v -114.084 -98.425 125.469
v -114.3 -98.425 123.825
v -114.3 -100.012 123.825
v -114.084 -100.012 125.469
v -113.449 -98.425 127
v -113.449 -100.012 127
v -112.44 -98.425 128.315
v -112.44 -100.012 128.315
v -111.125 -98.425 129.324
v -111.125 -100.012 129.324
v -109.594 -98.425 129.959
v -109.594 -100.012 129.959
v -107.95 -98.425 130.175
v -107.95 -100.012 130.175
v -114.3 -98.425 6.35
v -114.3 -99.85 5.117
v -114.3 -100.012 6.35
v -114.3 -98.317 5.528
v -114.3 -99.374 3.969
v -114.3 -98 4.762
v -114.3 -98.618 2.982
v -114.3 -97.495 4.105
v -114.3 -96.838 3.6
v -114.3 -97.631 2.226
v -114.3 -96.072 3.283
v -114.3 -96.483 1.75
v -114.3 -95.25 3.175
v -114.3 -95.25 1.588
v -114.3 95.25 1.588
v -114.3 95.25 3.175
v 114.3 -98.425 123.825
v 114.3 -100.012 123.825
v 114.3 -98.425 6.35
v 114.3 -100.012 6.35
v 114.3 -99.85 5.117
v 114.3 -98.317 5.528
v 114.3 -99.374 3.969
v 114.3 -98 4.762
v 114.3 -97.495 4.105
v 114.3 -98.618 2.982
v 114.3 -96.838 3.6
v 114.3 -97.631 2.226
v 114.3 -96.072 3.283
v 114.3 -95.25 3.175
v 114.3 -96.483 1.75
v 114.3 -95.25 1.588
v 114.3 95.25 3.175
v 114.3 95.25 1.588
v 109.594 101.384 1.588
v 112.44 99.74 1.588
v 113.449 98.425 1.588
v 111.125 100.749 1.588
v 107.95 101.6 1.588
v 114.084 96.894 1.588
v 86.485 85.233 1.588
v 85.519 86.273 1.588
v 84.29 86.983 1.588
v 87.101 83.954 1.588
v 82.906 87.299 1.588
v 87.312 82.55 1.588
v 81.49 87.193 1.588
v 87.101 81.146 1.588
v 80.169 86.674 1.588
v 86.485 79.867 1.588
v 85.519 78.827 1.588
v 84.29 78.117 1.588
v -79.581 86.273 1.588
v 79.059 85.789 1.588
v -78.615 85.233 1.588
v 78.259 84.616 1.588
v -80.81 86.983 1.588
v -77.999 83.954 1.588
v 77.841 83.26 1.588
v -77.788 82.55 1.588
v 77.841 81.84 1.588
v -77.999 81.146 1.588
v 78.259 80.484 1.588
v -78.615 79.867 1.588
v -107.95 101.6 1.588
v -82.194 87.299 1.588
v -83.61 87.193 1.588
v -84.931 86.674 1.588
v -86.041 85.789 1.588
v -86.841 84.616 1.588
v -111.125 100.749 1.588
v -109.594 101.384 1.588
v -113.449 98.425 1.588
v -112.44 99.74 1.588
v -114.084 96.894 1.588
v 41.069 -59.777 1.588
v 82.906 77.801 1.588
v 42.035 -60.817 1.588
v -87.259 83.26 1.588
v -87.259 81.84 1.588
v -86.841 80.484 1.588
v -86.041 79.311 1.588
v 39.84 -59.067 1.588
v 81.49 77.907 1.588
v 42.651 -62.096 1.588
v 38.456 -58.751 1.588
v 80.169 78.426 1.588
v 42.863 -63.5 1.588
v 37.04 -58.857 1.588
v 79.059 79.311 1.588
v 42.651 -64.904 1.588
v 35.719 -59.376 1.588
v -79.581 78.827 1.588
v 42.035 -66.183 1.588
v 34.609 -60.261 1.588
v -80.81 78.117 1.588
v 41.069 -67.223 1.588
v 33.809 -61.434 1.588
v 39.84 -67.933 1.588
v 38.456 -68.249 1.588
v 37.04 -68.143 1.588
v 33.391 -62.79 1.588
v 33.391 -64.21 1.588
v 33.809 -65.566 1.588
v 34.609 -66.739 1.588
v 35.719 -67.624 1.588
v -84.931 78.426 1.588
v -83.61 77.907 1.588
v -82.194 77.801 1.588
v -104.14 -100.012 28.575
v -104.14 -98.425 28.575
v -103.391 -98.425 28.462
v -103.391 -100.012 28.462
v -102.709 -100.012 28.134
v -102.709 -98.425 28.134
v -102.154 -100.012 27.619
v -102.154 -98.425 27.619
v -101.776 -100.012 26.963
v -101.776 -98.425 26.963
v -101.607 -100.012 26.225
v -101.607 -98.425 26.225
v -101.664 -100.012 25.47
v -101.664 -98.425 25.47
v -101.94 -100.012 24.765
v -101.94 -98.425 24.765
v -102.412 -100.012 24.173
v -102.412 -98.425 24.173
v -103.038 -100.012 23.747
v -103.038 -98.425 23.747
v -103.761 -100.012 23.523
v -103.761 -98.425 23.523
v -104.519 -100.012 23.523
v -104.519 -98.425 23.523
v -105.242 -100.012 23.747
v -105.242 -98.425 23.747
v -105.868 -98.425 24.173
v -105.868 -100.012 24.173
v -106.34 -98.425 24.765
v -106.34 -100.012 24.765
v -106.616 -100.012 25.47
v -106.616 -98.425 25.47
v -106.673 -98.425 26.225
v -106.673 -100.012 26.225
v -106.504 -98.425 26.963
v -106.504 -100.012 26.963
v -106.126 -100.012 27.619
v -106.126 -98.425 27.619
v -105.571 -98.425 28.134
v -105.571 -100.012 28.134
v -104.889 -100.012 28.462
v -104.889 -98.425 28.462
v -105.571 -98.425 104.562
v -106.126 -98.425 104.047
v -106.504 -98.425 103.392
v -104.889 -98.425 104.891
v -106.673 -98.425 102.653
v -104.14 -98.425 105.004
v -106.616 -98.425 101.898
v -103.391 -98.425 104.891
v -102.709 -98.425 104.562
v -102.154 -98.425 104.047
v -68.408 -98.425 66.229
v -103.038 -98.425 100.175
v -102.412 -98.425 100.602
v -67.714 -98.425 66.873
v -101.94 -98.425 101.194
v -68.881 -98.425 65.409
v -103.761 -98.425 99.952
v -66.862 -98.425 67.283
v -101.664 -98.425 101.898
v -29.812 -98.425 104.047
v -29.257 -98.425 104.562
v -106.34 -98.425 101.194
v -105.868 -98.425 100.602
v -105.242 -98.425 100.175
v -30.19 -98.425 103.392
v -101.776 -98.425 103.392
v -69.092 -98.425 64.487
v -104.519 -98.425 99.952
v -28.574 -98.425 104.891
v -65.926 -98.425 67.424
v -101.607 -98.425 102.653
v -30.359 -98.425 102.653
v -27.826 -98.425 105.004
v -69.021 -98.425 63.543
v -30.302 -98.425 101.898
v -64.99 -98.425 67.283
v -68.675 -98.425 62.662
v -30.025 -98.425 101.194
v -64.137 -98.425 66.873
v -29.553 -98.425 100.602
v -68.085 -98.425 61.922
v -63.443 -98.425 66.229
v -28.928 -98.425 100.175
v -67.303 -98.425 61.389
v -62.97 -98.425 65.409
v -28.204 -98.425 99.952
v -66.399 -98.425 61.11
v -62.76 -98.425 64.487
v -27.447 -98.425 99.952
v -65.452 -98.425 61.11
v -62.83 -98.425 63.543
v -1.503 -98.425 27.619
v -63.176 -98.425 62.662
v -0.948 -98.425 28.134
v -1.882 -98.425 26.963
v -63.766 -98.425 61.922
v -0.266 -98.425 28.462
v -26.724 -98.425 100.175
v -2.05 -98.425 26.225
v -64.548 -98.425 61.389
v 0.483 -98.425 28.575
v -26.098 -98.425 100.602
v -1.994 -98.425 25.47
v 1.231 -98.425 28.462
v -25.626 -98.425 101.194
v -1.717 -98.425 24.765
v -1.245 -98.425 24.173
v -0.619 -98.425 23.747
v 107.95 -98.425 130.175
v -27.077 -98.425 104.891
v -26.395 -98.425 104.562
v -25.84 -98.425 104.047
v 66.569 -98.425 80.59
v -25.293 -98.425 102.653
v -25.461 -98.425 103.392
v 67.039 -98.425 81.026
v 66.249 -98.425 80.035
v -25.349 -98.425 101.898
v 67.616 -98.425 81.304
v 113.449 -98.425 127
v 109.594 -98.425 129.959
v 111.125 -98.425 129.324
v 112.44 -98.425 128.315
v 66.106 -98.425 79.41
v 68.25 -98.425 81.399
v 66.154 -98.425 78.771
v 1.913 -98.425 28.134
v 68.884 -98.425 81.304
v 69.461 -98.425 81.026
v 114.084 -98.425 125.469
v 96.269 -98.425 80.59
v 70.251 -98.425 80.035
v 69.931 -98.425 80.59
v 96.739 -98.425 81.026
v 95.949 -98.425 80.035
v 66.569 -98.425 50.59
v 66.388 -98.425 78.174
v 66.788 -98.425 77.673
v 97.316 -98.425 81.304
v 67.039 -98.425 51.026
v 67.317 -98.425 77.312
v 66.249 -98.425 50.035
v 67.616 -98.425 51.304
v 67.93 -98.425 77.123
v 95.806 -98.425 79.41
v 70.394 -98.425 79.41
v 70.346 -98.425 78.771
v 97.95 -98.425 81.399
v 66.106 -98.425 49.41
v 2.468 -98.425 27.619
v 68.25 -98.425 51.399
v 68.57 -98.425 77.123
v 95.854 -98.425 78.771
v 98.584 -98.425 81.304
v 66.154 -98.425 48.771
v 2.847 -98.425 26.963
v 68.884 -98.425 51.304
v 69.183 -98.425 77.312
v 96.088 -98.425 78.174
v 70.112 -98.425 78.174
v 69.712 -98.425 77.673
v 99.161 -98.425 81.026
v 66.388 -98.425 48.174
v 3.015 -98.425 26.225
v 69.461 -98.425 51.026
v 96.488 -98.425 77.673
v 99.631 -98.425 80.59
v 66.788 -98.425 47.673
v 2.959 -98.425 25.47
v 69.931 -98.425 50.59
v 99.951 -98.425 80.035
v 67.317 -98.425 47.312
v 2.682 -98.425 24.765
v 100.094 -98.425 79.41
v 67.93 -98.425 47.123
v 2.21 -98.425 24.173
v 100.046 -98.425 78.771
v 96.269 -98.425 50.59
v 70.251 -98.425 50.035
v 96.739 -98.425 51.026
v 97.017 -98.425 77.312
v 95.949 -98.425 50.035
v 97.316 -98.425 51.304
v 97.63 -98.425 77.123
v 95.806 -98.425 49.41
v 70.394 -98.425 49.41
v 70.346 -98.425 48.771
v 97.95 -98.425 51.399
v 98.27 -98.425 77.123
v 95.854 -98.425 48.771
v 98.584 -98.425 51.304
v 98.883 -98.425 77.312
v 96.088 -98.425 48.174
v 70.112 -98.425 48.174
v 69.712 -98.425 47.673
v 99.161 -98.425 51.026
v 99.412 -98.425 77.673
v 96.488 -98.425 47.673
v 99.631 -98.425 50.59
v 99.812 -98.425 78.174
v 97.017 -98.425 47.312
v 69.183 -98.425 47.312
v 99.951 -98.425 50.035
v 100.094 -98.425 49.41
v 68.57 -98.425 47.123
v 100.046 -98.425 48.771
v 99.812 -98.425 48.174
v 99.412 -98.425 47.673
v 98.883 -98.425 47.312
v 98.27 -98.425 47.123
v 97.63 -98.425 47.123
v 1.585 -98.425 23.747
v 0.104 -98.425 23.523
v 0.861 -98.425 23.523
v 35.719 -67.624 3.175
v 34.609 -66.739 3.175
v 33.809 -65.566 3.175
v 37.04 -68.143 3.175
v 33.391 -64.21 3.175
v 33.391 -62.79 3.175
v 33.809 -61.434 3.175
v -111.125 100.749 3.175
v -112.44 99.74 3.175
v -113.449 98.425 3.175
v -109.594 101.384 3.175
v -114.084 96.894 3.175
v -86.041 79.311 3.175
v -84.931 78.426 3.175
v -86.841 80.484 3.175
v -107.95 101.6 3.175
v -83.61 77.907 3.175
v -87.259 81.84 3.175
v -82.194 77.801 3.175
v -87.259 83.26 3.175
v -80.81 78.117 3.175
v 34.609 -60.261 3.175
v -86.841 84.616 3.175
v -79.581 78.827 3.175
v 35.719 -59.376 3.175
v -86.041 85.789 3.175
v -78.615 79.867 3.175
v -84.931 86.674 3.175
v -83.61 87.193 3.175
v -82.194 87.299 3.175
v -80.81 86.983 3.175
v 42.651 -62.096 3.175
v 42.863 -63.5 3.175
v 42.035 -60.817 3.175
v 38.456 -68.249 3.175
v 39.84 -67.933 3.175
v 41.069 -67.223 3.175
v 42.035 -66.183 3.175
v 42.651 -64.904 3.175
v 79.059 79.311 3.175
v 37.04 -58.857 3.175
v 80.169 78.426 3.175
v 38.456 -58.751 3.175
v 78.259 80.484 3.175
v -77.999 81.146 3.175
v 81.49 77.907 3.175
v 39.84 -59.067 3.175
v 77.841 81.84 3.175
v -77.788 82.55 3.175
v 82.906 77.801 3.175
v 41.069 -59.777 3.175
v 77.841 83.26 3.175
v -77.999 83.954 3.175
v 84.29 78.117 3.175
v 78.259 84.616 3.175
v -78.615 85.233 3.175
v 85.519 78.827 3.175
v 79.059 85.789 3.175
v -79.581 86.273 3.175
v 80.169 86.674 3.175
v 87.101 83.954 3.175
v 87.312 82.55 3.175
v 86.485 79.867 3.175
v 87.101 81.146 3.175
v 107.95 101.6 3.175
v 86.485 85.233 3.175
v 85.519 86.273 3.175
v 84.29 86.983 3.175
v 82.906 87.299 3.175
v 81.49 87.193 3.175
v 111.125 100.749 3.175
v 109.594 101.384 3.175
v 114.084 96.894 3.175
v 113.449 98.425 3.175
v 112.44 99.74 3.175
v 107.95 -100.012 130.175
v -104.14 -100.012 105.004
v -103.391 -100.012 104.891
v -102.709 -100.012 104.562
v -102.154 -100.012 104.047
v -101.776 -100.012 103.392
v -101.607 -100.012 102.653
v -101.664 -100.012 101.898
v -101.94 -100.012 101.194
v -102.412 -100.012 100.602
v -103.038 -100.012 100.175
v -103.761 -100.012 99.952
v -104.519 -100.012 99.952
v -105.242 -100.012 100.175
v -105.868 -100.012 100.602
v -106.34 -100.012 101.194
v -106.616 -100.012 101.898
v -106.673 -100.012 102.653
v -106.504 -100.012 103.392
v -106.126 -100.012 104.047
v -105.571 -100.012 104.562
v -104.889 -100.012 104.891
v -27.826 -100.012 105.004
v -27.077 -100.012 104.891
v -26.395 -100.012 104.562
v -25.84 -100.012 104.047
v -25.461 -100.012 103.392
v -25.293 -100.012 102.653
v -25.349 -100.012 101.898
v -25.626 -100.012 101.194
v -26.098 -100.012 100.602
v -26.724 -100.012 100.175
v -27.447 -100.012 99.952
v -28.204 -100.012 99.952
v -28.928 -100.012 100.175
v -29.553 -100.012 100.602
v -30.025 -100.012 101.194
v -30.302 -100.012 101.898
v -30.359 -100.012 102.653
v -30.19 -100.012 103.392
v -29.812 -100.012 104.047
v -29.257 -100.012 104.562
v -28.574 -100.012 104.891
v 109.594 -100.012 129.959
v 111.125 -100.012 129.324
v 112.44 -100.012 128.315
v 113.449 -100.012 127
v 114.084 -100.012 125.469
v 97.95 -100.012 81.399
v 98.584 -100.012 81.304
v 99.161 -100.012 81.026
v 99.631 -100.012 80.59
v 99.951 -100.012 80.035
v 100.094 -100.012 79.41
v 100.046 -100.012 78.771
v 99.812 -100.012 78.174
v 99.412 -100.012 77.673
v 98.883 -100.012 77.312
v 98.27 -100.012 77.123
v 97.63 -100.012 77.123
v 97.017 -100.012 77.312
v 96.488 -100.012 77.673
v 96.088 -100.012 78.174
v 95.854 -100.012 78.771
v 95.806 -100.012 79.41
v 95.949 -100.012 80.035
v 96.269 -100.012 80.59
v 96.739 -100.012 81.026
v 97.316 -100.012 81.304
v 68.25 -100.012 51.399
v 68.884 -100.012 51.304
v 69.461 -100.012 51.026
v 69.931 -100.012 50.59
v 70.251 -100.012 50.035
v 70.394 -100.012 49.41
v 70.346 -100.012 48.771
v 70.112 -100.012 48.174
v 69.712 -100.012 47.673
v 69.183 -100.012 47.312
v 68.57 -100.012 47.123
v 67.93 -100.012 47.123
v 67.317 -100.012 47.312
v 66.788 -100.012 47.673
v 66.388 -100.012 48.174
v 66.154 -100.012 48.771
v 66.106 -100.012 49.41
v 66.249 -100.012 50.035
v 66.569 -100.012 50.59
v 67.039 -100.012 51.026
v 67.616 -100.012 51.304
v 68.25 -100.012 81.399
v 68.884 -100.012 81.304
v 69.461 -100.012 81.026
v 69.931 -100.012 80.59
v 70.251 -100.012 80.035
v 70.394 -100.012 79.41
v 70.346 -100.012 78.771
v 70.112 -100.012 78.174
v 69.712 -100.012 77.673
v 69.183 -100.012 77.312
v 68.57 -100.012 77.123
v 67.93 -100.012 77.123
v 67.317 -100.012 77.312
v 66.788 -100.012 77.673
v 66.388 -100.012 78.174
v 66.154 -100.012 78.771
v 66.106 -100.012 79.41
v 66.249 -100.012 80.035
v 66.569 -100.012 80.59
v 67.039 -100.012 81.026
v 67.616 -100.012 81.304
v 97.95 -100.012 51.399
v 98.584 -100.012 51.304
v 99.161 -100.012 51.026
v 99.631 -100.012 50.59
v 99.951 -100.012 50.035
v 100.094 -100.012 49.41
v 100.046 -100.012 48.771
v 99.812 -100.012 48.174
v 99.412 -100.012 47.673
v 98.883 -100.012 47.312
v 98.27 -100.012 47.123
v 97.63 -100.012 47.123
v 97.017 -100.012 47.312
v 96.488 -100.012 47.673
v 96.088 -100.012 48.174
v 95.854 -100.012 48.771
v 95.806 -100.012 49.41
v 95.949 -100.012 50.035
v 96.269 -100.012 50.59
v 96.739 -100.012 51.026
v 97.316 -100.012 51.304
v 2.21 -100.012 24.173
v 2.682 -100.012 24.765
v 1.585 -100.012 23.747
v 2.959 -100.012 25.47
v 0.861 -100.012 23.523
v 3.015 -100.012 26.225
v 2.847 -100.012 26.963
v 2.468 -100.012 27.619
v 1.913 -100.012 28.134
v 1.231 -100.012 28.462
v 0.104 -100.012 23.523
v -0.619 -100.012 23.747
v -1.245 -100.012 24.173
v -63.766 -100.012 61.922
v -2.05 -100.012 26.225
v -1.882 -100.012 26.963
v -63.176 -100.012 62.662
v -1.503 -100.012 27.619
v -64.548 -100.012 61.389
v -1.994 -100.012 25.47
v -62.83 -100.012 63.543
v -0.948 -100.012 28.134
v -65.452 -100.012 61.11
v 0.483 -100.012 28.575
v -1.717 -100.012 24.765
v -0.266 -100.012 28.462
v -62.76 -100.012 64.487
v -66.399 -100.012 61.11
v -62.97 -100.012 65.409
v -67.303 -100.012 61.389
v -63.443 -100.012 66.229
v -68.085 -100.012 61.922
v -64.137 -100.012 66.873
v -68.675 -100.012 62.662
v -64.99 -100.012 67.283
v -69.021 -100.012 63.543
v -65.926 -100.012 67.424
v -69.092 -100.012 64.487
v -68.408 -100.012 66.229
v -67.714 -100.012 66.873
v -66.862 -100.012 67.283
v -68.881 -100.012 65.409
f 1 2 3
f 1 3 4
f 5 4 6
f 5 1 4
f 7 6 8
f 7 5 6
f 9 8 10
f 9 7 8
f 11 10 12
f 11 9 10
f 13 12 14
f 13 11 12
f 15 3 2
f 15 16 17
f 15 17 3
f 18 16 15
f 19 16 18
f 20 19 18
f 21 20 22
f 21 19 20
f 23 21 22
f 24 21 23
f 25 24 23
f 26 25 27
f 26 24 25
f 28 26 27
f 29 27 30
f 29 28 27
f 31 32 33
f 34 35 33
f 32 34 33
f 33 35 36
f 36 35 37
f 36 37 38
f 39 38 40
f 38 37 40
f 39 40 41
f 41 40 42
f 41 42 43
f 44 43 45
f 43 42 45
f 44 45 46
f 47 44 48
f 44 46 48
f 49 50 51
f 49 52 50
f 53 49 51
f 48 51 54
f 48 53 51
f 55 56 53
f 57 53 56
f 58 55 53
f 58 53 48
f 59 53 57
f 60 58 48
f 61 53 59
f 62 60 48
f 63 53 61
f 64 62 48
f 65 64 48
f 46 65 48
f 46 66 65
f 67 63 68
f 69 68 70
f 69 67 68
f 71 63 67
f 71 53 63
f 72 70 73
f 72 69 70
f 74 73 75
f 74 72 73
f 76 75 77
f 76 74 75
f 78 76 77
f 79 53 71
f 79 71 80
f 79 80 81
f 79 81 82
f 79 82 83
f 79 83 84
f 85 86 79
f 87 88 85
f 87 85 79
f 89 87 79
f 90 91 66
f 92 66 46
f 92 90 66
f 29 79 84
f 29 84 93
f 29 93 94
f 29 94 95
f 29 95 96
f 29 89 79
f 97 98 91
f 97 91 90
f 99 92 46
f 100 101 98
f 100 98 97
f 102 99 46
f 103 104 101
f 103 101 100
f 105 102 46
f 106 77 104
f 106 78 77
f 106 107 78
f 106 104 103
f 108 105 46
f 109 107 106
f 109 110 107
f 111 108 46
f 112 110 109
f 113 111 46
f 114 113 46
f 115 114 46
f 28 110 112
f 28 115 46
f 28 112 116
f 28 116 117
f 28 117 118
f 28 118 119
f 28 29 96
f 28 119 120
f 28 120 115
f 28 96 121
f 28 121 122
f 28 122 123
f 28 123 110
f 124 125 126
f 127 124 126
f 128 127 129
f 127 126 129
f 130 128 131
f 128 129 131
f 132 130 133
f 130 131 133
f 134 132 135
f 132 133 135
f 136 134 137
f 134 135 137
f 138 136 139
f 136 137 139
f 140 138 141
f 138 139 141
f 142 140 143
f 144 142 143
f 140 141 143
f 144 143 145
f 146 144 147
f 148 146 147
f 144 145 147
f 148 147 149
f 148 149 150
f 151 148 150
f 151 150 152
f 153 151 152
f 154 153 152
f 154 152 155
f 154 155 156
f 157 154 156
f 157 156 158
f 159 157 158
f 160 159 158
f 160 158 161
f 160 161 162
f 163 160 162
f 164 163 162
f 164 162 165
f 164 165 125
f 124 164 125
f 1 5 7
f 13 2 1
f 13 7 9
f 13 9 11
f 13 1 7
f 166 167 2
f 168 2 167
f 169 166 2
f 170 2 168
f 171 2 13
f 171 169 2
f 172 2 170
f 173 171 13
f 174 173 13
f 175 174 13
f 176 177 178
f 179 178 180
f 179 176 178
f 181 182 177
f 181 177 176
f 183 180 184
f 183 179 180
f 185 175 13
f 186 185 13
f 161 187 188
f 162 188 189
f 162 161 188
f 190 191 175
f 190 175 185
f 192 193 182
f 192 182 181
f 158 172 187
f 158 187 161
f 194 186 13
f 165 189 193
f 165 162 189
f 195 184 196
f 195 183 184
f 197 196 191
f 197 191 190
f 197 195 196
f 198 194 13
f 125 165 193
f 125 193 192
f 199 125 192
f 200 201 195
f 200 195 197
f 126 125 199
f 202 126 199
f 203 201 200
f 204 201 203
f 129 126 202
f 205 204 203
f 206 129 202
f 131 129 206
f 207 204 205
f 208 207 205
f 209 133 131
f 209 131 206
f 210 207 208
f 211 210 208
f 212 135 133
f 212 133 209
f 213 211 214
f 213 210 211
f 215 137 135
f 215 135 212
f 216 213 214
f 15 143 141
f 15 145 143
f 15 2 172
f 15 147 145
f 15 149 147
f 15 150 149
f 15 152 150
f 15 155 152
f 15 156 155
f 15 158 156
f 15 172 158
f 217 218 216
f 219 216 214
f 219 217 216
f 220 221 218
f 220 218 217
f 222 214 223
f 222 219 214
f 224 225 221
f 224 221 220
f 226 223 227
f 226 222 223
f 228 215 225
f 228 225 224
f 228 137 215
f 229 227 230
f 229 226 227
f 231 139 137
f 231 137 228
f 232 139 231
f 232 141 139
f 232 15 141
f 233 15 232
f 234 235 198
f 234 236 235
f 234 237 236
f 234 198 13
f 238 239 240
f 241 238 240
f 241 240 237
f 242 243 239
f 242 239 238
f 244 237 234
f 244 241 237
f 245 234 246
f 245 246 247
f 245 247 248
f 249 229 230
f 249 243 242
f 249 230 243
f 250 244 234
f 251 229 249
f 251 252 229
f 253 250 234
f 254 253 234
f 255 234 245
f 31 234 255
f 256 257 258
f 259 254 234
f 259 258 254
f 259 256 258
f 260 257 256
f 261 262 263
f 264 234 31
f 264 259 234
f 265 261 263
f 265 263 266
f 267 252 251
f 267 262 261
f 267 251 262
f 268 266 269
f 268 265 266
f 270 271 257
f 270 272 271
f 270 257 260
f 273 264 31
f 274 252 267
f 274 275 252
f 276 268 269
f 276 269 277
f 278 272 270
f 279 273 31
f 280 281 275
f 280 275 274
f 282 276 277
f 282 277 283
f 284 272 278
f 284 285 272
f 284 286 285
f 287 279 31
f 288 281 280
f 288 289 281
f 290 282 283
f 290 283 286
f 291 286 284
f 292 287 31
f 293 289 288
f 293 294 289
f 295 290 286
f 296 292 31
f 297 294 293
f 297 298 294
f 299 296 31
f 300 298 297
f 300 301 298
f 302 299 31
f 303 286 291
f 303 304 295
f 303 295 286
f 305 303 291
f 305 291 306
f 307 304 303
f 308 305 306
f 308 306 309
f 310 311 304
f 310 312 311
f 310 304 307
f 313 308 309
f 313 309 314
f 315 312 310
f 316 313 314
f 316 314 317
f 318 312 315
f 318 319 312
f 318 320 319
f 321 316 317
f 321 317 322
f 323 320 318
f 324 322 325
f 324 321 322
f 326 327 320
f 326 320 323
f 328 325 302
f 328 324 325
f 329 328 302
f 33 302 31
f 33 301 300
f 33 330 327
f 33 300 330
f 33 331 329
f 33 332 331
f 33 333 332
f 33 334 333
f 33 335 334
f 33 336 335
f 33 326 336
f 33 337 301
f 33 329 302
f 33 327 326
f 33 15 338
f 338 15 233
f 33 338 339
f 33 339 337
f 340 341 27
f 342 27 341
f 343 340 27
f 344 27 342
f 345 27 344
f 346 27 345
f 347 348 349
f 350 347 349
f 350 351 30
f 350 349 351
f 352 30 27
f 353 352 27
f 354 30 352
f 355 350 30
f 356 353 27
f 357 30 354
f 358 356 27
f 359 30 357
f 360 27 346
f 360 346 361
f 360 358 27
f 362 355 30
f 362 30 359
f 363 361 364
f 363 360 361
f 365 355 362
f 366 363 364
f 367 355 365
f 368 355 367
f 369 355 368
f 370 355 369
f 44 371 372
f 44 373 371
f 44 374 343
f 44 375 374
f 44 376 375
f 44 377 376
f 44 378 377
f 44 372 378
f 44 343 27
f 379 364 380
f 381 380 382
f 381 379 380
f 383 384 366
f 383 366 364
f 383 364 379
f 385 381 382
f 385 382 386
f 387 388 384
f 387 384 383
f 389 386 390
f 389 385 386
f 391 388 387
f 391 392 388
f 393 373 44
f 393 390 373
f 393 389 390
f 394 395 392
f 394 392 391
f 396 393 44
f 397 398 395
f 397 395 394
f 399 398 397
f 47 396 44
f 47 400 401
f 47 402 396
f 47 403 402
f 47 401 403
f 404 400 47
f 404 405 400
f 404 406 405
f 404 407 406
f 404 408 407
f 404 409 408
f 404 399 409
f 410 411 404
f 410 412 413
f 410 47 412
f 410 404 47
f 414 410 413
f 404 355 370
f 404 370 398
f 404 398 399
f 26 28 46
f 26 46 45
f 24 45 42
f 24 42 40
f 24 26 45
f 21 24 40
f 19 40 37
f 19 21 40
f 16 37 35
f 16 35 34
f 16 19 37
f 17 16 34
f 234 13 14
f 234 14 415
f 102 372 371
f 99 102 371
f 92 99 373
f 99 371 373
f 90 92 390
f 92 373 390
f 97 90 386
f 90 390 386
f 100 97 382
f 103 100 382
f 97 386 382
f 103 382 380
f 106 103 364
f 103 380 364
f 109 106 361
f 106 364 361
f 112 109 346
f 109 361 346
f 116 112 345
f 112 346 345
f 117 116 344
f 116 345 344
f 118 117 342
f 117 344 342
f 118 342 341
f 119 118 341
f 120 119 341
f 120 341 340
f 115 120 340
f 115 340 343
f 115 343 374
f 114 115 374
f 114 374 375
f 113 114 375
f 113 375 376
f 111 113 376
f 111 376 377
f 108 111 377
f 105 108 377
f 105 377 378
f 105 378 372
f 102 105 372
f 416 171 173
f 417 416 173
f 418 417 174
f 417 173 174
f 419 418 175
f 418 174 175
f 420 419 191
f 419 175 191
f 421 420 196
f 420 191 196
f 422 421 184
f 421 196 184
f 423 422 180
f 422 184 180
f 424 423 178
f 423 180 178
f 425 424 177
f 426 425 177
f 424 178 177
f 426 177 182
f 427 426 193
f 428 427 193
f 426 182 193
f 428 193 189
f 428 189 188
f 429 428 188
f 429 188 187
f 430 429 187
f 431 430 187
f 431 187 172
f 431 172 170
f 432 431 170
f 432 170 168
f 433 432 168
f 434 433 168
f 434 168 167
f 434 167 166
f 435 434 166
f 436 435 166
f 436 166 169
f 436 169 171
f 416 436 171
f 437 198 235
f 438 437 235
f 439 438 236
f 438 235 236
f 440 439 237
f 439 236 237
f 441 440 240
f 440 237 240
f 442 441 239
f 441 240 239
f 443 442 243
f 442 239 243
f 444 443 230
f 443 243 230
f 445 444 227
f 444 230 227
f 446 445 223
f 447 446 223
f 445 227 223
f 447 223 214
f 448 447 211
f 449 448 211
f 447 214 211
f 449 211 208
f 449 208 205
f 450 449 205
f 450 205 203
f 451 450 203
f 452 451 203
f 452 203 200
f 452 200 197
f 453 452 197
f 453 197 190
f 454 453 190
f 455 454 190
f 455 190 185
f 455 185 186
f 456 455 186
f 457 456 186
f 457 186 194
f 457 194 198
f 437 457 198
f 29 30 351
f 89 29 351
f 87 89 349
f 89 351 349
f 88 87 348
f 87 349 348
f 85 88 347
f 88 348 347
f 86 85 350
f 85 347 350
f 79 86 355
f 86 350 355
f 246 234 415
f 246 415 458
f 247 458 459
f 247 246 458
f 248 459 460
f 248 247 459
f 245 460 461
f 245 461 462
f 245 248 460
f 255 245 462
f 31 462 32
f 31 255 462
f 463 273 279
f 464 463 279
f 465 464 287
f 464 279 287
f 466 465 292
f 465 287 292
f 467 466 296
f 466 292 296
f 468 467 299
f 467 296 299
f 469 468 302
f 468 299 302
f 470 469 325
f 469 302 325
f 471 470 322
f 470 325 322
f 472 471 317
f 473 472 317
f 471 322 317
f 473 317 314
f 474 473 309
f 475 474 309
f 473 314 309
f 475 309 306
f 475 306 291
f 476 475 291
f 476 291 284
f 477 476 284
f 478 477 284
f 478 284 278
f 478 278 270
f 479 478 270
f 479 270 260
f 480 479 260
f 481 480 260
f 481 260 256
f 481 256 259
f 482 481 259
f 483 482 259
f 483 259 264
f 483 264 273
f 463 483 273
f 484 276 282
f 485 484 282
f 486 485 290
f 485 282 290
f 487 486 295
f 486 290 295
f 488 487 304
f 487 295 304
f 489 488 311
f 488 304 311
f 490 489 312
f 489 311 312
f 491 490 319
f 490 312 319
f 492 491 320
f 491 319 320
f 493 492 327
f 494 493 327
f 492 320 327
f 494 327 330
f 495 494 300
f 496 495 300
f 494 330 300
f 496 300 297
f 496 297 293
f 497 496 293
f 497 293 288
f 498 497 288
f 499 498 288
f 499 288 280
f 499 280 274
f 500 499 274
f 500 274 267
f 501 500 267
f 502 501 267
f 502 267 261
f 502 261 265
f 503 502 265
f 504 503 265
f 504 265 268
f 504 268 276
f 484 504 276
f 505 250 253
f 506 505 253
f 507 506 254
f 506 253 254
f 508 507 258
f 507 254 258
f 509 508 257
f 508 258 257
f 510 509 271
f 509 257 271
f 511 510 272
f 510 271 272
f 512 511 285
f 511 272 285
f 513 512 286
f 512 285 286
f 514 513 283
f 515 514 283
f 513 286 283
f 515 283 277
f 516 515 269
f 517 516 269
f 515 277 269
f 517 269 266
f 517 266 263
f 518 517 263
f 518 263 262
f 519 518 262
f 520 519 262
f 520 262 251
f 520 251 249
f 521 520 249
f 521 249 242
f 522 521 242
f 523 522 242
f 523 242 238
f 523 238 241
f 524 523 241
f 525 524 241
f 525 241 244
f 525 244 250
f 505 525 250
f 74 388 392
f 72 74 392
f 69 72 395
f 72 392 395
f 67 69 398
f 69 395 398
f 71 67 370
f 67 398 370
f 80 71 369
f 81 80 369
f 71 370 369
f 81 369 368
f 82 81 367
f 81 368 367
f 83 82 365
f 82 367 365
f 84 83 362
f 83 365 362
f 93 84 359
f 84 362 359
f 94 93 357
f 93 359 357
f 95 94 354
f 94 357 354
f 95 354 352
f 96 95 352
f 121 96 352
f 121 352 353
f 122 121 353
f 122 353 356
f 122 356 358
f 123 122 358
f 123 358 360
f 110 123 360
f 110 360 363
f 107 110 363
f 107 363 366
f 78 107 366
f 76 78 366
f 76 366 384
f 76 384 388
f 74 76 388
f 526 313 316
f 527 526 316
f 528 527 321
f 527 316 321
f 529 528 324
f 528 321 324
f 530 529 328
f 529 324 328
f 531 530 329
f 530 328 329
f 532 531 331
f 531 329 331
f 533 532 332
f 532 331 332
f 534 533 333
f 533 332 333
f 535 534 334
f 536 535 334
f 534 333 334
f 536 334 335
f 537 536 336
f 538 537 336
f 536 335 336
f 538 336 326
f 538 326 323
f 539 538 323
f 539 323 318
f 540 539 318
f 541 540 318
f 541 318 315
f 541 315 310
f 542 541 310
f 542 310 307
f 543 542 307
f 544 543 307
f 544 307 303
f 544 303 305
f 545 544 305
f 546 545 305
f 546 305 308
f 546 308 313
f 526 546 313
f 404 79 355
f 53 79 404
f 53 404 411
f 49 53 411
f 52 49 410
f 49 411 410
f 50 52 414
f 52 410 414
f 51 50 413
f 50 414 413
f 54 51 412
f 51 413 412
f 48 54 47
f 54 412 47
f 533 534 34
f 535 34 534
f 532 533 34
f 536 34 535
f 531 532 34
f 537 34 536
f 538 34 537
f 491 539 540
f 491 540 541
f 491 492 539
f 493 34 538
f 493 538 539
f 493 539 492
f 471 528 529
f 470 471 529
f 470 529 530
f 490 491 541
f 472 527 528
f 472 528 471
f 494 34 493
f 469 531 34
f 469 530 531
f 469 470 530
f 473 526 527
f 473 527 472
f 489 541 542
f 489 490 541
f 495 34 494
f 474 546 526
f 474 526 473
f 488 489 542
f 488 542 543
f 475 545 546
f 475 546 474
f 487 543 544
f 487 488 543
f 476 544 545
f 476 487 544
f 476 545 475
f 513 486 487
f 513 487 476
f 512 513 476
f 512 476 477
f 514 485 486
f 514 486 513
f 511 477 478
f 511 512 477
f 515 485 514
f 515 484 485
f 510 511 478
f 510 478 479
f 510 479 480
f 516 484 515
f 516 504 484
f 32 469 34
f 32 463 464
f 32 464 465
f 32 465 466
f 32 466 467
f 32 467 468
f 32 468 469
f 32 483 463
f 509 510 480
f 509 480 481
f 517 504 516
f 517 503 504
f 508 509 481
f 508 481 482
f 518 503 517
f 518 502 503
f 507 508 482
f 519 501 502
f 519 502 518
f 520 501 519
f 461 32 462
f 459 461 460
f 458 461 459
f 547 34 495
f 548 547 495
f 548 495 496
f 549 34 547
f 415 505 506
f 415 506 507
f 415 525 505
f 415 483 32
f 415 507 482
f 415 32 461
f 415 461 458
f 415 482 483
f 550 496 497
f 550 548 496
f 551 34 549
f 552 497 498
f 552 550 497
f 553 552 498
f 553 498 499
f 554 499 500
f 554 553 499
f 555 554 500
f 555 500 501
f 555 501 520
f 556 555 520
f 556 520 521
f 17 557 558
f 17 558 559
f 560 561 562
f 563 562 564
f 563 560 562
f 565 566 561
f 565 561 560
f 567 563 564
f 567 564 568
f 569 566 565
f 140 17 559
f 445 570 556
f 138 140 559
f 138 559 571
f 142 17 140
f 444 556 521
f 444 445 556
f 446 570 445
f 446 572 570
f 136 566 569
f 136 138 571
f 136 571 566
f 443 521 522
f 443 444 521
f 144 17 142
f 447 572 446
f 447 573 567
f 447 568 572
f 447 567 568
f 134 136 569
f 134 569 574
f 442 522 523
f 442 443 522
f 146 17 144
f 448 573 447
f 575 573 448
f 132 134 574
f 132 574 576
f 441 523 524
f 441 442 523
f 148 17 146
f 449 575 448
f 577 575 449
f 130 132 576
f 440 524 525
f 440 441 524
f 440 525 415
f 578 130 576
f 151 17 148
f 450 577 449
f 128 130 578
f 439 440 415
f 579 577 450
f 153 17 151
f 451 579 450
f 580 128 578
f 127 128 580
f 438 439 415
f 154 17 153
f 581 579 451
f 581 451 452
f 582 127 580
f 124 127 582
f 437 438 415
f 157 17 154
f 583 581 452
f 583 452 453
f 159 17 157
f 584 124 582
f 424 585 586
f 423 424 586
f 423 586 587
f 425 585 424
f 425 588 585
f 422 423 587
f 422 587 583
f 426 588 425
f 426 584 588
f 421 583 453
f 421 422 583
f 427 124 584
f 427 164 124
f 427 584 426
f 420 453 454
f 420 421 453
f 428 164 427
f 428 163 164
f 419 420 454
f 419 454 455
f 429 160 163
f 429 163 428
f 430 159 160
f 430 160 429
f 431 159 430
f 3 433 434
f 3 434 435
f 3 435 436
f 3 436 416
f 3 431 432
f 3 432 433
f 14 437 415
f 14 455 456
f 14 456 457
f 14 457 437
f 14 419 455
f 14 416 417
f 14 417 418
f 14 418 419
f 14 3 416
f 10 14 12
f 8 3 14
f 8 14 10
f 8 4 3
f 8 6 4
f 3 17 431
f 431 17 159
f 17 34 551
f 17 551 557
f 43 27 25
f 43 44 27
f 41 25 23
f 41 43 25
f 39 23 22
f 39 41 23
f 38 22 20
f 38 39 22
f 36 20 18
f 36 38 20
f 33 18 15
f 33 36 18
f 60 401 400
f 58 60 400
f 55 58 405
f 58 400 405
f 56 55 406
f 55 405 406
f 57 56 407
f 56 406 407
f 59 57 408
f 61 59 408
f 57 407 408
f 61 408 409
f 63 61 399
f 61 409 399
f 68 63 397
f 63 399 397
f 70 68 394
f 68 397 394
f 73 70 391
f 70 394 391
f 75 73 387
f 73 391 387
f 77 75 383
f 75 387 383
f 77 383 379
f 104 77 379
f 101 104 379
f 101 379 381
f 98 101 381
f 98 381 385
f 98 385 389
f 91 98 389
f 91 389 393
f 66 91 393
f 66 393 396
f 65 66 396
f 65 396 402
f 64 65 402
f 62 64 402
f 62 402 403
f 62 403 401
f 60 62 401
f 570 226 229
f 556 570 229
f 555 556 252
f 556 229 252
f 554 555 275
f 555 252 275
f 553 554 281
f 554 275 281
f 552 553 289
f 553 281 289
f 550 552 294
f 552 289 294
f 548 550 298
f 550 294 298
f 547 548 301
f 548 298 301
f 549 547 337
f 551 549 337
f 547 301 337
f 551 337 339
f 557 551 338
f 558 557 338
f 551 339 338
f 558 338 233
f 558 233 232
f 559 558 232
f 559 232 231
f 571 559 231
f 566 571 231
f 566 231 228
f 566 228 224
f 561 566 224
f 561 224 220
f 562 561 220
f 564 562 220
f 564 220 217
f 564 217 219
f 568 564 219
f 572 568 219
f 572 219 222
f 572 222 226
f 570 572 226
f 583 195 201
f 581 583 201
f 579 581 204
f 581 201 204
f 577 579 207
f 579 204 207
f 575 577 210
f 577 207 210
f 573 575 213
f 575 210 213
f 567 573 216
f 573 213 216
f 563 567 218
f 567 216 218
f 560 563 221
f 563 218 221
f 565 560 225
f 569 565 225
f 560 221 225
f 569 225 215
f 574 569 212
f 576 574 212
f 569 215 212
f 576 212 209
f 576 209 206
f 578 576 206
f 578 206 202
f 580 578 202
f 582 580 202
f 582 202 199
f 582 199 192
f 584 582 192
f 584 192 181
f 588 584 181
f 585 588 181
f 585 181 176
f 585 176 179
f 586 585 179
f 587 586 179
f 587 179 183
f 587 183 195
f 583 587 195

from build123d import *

# Parameters (mm, degrees)
SKETCH2_W            = 228.6
SKETCH2_H            = 203.2
BOSS_EXTRUDE1_DEPTH  = 3.175
SKETCH3_W            = 228.6
SKETCH3_H            = 3.175
BOSS_EXTRUDE2_DEPTH  = 127
FILLET1_R            = 3.175
FILLET2_R            = 6.35
SKETCH4_R            = 2.54
SKETCH4_R_2          = 2.15
SKETCH4_R_3          = 3.175
CUT_EXTRUDE1_DEPTH   = 265.612965007
CONVERT_SOLID1_START = -114.3
CONVERT_SOLID1_DEPTH = 228.6
SKETCH9_R            = 4.7625
CUT_EXTRUDE2_DEPTH   = 199.7864432


# Read off the part's stored shape, not the designer's step: Convert-Solid1
with BuildPart() as part:
    # Sketch2 → Boss-Extrude1 (new body)
    with BuildSketch(Plane.XY):
        Rectangle(SKETCH2_W, SKETCH2_H)
    extrude(amount=BOSS_EXTRUDE1_DEPTH)

    # Sketch3 → Boss-Extrude2 (add)
    with BuildSketch(Plane.XY.offset(3.175)):
        with Locations((0, -100.0125)):
            Rectangle(SKETCH3_W, SKETCH3_H)
    extrude(amount=BOSS_EXTRUDE2_DEPTH)

    # Fillet1
    fillet1_edges = [part.edges().sort_by_distance(p)[0] for p in [
        (0, -98.425, 3.175),
        (0, -101.6, 0),
    ]]
    fillet(fillet1_edges, radius=FILLET1_R)

    # Fillet2
    fillet2_edges = [part.edges().sort_by_distance(p)[0] for p in [
        (-114.3, -100.0125, 130.175),
        (114.3, -100.0125, 130.175),
        (-114.3, 101.6, 1.5875),
        (114.3, 101.6, 1.5875),
    ]]
    fillet(fillet2_edges, radius=FILLET2_R)

    # Sketch4 → Cut-Extrude1 (cut, through all)
    with BuildSketch(Plane(origin=(0, -98.425, 0), x_dir=(1, 0, 0), z_dir=(0, 1, 0))):
        with Locations(Location((-104.14, -26.035, 0), (0, 0, 270))):
            Circle(SKETCH4_R)
        with Locations(Location((-104.14, -102.4636, 0), (0, 0, 270))):
            Circle(SKETCH4_R)
        with Locations(Location((0.4826, -26.035, 0), (0, 0, 270))):
            Circle(SKETCH4_R)
        with Locations(Location((-27.8257, -102.4636, 0), (0, 0, 270))):
            Circle(SKETCH4_R)
        with Locations(Location((68.25, -79.2493, 0), (0, 0, 270))):
            Circle(SKETCH4_R_2)
        with Locations(Location((97.95, -79.2493, 0), (0, 0, 270))):
            Circle(SKETCH4_R_2)
        with Locations(Location((68.25, -49.2493, 0), (0, 0, 270))):
            Circle(SKETCH4_R_2)
        with Locations(Location((97.95, -49.2493, 0), (0, 0, 270))):
            Circle(SKETCH4_R_2)
        with Locations(Location((-65.9257, -64.2493, 0), (0, 0, 270))):
            Circle(SKETCH4_R_3)
    extrude(amount=-CUT_EXTRUDE1_DEPTH, mode=Mode.SUBTRACT)

    # Convert-Solid1 outline → Convert-Solid1 (cut)
    with BuildSketch(Plane.YZ.offset(CONVERT_SOLID1_START)):
        with BuildLine():
            ThreePointArc((-95.25, 1.5875), (-98.617596045, 2.982403955), (-100.0125, 6.35))
            Line((-100.0125, 6.35), (-100.0125, 130.175))
            Line((-100.0125, 130.175), (-101.6, 130.175))
            Line((-101.6, 130.175), (-101.6, 3.175))
            ThreePointArc((-101.6, 3.175), (-100.67006403, 0.92993597), (-98.425, 0))
            Line((-98.425, 0), (101.6, 0))
            Line((101.6, 0), (101.6, 1.5875))
            Line((101.6, 1.5875), (-95.25, 1.5875))
        make_face()
    extrude(amount=CONVERT_SOLID1_DEPTH, mode=Mode.SUBTRACT)

    # Sketch9 → Cut-Extrude2 (cut, through all)
    with BuildSketch(Plane.XY.offset(3.175)):
        with Locations((-82.55, 82.55)):
            Circle(SKETCH9_R)
        with Locations((82.55, 82.55)):
            Circle(SKETCH9_R)
        with Locations((38.1, -63.5)):
            Circle(SKETCH9_R)
    extrude(amount=-CUT_EXTRUDE2_DEPTH, mode=Mode.SUBTRACT)


solid = part.part
